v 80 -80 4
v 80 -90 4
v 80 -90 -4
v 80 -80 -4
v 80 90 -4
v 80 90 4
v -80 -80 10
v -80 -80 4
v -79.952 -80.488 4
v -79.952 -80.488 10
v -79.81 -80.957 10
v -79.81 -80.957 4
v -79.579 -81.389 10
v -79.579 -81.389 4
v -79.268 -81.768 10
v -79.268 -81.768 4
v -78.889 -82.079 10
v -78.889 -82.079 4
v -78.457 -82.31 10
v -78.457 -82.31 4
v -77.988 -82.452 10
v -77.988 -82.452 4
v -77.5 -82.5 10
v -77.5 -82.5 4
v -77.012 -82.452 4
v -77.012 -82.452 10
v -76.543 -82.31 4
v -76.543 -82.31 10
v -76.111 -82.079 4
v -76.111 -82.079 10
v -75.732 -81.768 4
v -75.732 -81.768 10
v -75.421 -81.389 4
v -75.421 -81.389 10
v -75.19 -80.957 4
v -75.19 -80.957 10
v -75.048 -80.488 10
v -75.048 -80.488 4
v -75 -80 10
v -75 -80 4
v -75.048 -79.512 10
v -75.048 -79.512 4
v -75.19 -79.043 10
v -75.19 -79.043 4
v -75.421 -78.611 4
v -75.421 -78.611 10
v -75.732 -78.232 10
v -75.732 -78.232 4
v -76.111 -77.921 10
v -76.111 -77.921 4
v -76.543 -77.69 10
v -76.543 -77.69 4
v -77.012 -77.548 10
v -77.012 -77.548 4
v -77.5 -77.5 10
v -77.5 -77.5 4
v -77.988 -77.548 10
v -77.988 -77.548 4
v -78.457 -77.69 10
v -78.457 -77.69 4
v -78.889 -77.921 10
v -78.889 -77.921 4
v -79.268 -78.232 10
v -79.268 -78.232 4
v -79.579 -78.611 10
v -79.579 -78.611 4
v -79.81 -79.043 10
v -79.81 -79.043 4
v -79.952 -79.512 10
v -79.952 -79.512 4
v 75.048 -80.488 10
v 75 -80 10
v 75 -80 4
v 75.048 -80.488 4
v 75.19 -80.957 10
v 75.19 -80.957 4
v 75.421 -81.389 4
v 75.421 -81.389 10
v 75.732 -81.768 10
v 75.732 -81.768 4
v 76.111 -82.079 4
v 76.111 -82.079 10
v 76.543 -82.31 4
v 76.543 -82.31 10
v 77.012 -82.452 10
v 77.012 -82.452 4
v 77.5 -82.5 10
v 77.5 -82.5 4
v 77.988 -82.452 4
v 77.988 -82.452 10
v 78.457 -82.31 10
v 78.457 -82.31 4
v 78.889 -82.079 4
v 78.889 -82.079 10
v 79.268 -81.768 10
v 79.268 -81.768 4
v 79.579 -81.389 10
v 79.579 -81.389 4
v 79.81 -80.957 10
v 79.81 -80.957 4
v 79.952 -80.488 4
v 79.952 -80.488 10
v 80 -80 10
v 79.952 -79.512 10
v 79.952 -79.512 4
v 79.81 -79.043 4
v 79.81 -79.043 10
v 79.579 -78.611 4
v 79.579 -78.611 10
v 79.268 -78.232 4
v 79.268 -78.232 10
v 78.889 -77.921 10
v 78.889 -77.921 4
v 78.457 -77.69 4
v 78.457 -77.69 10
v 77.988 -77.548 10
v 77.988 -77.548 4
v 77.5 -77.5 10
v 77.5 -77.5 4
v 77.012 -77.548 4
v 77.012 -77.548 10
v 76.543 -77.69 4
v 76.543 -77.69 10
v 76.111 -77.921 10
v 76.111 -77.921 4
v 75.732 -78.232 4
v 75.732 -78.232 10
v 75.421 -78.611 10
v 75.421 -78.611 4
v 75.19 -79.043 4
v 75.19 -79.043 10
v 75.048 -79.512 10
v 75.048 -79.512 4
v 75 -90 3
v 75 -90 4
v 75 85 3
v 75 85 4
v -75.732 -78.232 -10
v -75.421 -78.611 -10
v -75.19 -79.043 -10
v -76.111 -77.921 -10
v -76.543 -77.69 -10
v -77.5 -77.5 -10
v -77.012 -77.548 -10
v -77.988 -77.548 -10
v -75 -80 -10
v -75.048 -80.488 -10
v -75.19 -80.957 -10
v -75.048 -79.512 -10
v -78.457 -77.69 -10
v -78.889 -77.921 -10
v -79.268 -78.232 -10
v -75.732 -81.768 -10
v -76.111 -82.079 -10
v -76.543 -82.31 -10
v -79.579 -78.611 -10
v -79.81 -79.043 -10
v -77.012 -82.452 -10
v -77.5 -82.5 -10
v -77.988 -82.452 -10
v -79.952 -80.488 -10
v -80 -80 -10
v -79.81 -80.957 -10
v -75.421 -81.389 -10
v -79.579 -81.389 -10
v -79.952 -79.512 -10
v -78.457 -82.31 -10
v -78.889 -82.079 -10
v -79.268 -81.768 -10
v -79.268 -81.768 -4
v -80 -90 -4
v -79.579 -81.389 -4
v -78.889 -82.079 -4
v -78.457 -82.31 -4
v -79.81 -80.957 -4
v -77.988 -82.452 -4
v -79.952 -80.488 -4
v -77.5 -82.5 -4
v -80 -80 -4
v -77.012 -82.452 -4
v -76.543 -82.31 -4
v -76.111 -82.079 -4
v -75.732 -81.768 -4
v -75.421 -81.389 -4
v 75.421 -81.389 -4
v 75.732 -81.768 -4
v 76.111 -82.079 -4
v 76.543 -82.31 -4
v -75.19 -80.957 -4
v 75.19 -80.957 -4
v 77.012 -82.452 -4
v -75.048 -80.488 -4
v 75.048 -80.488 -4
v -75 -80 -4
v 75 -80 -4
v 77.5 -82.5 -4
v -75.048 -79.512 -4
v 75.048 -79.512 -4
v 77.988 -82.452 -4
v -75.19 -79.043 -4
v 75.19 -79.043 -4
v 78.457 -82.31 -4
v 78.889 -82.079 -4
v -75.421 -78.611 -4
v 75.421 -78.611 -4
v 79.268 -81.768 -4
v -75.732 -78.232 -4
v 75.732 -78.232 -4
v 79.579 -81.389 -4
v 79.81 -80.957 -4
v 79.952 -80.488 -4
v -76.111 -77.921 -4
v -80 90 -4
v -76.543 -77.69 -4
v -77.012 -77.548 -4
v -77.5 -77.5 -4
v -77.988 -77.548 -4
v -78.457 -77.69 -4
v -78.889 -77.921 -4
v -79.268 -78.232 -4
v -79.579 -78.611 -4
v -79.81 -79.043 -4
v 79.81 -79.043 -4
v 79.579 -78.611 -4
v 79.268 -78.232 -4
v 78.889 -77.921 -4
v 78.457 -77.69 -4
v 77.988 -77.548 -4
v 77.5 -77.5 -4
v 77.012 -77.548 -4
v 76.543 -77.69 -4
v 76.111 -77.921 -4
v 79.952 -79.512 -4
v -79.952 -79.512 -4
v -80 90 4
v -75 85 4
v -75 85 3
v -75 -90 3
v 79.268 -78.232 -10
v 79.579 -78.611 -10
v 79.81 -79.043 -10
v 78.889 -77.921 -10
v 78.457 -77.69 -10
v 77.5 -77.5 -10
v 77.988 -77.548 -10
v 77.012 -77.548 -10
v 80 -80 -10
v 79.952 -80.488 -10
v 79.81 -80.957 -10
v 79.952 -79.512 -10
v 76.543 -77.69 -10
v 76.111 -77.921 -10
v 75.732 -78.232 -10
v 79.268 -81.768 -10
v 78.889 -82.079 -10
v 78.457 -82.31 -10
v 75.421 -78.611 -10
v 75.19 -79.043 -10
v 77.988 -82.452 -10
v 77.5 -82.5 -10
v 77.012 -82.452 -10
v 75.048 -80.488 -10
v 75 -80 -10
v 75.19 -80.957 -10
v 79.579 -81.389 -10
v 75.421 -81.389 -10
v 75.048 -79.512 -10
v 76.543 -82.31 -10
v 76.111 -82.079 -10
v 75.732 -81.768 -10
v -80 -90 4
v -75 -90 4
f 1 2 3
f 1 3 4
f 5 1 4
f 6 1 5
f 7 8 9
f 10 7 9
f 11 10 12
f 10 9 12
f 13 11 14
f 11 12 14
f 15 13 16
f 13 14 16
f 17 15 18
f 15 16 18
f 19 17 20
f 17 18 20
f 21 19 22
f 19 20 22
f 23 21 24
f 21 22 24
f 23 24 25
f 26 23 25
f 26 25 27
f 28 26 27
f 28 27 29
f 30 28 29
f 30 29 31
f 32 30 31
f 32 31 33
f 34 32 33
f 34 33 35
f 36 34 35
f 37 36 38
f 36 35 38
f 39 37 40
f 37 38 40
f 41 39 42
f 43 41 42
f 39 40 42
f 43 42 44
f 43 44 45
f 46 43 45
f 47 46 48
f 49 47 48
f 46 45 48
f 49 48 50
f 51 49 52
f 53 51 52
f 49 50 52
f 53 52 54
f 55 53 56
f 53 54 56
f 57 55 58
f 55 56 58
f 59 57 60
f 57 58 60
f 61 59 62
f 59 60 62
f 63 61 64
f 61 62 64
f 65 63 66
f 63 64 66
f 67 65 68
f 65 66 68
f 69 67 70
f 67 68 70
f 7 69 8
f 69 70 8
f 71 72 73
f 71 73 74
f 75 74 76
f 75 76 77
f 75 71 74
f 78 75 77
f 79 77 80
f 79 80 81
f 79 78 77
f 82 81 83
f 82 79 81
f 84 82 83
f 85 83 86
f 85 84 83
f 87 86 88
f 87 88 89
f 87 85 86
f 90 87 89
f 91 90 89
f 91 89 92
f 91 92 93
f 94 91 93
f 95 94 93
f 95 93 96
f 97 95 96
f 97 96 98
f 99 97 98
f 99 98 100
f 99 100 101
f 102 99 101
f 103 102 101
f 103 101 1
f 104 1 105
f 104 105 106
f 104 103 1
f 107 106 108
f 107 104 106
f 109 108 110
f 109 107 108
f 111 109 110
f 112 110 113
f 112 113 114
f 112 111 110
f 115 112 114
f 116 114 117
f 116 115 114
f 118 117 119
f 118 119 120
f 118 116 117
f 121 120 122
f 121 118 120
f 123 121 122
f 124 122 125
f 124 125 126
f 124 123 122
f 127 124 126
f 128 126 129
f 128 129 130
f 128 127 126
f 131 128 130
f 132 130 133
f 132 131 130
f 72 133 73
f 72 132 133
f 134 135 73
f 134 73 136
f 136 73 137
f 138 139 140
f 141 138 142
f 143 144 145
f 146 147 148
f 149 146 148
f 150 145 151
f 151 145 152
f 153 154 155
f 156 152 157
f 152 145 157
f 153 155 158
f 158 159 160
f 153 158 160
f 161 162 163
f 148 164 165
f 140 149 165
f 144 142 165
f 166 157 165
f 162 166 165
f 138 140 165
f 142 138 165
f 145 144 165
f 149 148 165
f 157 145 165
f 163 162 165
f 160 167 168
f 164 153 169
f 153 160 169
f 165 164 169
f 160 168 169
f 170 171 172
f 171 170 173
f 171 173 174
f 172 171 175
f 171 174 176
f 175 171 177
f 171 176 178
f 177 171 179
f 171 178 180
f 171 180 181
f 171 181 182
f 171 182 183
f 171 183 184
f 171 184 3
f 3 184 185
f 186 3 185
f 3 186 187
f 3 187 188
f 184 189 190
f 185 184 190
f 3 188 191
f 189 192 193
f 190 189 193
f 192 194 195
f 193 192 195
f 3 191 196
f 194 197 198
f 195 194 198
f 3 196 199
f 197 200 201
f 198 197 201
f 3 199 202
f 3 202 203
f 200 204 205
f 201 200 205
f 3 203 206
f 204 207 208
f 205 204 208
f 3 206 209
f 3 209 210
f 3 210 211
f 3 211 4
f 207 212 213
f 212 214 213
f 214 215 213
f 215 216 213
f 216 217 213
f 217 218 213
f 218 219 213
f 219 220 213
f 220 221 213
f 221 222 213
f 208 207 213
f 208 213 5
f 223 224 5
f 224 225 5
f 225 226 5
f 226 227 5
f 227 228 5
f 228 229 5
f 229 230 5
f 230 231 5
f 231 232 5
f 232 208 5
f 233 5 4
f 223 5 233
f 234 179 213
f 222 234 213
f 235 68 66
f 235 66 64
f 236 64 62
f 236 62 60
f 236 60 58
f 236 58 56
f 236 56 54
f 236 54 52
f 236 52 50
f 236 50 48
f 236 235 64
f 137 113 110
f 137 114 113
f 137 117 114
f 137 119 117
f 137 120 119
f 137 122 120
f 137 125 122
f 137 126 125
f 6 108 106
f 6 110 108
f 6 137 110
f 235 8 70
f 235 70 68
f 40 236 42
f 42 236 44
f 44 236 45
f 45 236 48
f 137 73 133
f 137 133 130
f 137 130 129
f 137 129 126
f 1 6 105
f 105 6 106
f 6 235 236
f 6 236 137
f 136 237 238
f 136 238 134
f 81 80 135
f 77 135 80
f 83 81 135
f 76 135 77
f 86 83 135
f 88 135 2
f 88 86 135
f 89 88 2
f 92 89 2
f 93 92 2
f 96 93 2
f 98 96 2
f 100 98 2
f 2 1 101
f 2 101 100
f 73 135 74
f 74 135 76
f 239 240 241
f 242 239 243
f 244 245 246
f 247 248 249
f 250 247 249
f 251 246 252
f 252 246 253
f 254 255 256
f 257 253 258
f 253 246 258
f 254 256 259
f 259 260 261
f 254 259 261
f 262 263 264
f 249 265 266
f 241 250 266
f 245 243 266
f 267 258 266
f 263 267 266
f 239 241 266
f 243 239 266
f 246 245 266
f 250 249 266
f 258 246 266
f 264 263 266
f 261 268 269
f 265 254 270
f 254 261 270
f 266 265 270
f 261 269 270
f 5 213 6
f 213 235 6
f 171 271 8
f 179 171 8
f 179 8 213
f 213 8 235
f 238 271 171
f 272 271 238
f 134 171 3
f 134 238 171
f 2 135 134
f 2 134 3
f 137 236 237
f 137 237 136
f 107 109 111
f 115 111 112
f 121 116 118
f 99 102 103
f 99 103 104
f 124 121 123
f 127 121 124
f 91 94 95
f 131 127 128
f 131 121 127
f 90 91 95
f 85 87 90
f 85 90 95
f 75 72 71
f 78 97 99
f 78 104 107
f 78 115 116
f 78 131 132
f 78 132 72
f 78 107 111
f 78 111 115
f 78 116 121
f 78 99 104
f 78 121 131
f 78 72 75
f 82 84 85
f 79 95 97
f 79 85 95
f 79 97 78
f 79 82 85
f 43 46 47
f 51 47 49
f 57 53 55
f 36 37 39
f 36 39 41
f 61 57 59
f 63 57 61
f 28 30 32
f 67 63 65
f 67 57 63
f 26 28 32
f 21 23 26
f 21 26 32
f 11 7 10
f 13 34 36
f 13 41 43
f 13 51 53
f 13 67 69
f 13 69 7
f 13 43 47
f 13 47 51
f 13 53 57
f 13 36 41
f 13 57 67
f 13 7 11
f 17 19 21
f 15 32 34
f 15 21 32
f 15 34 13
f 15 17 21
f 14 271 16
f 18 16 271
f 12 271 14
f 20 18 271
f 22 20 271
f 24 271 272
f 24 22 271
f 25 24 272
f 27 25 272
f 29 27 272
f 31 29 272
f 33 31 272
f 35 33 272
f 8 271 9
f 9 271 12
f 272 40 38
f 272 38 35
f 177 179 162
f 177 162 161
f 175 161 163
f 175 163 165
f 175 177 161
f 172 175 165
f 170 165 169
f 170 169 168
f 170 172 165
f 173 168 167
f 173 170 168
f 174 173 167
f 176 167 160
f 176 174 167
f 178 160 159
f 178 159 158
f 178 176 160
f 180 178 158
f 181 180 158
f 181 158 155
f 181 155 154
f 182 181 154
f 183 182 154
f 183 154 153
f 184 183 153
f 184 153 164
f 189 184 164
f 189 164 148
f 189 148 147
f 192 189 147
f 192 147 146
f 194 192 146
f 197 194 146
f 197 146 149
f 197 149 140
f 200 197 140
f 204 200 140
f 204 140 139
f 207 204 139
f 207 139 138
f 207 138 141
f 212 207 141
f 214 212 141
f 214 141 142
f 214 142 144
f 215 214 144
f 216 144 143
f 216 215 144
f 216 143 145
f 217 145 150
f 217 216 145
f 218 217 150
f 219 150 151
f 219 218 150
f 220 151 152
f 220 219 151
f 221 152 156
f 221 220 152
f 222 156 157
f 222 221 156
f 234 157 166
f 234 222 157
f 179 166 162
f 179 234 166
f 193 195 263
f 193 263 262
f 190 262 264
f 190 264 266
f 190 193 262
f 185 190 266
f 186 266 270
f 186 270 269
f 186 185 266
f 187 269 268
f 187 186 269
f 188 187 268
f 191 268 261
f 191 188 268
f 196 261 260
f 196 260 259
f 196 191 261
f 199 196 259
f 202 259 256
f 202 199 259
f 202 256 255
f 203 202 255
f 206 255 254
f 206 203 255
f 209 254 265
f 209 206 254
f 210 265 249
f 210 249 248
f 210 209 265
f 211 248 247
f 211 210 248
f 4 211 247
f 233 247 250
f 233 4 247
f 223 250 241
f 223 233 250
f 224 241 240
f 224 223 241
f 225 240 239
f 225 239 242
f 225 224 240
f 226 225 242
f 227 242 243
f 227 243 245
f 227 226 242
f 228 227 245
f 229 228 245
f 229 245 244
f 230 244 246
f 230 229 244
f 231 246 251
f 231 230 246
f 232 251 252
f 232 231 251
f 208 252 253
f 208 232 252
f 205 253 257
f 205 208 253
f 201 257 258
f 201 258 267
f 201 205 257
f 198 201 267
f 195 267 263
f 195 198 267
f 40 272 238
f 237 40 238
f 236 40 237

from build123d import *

# Parameters (mm, degrees)
SKETCH_1_W          = 160
SKETCH_1_H          = 180
EXTRUDE_1_DEPTH     = 4
SKETCH_2_W          = 150
SKETCH_2_H          = 175
CUT_EXTRUDE_1_DEPTH = 1
SKETCH_3_R          = 2.5
EXTRUDE_2_DEPTH     = 10


with BuildPart() as part:
    # 草图1 → 凸台-拉伸1 (new, symmetric)
    with BuildSketch(Plane.XY):
        Rectangle(SKETCH_1_W, SKETCH_1_H)
    extrude(amount=EXTRUDE_1_DEPTH, both=True)

    # 草图2 → 切除-拉伸1 (cut)
    with BuildSketch(Plane.XY.offset(4)):
        with Locations((0, -2.5)):
            Rectangle(SKETCH_2_W, SKETCH_2_H)
    extrude(amount=-CUT_EXTRUDE_1_DEPTH, mode=Mode.SUBTRACT)

    # 草图3 → 凸台-拉伸2 (add, symmetric)
    with BuildSketch(Plane.XY):
        with Locations(Location((-77.5, -80, 0), (0, 0, 180))):
            Circle(SKETCH_3_R)
        with Locations(Location((77.5, -80, 0), (0, 0, 180))):
            Circle(SKETCH_3_R)
    extrude(amount=EXTRUDE_2_DEPTH, both=True)


solid = part.part
